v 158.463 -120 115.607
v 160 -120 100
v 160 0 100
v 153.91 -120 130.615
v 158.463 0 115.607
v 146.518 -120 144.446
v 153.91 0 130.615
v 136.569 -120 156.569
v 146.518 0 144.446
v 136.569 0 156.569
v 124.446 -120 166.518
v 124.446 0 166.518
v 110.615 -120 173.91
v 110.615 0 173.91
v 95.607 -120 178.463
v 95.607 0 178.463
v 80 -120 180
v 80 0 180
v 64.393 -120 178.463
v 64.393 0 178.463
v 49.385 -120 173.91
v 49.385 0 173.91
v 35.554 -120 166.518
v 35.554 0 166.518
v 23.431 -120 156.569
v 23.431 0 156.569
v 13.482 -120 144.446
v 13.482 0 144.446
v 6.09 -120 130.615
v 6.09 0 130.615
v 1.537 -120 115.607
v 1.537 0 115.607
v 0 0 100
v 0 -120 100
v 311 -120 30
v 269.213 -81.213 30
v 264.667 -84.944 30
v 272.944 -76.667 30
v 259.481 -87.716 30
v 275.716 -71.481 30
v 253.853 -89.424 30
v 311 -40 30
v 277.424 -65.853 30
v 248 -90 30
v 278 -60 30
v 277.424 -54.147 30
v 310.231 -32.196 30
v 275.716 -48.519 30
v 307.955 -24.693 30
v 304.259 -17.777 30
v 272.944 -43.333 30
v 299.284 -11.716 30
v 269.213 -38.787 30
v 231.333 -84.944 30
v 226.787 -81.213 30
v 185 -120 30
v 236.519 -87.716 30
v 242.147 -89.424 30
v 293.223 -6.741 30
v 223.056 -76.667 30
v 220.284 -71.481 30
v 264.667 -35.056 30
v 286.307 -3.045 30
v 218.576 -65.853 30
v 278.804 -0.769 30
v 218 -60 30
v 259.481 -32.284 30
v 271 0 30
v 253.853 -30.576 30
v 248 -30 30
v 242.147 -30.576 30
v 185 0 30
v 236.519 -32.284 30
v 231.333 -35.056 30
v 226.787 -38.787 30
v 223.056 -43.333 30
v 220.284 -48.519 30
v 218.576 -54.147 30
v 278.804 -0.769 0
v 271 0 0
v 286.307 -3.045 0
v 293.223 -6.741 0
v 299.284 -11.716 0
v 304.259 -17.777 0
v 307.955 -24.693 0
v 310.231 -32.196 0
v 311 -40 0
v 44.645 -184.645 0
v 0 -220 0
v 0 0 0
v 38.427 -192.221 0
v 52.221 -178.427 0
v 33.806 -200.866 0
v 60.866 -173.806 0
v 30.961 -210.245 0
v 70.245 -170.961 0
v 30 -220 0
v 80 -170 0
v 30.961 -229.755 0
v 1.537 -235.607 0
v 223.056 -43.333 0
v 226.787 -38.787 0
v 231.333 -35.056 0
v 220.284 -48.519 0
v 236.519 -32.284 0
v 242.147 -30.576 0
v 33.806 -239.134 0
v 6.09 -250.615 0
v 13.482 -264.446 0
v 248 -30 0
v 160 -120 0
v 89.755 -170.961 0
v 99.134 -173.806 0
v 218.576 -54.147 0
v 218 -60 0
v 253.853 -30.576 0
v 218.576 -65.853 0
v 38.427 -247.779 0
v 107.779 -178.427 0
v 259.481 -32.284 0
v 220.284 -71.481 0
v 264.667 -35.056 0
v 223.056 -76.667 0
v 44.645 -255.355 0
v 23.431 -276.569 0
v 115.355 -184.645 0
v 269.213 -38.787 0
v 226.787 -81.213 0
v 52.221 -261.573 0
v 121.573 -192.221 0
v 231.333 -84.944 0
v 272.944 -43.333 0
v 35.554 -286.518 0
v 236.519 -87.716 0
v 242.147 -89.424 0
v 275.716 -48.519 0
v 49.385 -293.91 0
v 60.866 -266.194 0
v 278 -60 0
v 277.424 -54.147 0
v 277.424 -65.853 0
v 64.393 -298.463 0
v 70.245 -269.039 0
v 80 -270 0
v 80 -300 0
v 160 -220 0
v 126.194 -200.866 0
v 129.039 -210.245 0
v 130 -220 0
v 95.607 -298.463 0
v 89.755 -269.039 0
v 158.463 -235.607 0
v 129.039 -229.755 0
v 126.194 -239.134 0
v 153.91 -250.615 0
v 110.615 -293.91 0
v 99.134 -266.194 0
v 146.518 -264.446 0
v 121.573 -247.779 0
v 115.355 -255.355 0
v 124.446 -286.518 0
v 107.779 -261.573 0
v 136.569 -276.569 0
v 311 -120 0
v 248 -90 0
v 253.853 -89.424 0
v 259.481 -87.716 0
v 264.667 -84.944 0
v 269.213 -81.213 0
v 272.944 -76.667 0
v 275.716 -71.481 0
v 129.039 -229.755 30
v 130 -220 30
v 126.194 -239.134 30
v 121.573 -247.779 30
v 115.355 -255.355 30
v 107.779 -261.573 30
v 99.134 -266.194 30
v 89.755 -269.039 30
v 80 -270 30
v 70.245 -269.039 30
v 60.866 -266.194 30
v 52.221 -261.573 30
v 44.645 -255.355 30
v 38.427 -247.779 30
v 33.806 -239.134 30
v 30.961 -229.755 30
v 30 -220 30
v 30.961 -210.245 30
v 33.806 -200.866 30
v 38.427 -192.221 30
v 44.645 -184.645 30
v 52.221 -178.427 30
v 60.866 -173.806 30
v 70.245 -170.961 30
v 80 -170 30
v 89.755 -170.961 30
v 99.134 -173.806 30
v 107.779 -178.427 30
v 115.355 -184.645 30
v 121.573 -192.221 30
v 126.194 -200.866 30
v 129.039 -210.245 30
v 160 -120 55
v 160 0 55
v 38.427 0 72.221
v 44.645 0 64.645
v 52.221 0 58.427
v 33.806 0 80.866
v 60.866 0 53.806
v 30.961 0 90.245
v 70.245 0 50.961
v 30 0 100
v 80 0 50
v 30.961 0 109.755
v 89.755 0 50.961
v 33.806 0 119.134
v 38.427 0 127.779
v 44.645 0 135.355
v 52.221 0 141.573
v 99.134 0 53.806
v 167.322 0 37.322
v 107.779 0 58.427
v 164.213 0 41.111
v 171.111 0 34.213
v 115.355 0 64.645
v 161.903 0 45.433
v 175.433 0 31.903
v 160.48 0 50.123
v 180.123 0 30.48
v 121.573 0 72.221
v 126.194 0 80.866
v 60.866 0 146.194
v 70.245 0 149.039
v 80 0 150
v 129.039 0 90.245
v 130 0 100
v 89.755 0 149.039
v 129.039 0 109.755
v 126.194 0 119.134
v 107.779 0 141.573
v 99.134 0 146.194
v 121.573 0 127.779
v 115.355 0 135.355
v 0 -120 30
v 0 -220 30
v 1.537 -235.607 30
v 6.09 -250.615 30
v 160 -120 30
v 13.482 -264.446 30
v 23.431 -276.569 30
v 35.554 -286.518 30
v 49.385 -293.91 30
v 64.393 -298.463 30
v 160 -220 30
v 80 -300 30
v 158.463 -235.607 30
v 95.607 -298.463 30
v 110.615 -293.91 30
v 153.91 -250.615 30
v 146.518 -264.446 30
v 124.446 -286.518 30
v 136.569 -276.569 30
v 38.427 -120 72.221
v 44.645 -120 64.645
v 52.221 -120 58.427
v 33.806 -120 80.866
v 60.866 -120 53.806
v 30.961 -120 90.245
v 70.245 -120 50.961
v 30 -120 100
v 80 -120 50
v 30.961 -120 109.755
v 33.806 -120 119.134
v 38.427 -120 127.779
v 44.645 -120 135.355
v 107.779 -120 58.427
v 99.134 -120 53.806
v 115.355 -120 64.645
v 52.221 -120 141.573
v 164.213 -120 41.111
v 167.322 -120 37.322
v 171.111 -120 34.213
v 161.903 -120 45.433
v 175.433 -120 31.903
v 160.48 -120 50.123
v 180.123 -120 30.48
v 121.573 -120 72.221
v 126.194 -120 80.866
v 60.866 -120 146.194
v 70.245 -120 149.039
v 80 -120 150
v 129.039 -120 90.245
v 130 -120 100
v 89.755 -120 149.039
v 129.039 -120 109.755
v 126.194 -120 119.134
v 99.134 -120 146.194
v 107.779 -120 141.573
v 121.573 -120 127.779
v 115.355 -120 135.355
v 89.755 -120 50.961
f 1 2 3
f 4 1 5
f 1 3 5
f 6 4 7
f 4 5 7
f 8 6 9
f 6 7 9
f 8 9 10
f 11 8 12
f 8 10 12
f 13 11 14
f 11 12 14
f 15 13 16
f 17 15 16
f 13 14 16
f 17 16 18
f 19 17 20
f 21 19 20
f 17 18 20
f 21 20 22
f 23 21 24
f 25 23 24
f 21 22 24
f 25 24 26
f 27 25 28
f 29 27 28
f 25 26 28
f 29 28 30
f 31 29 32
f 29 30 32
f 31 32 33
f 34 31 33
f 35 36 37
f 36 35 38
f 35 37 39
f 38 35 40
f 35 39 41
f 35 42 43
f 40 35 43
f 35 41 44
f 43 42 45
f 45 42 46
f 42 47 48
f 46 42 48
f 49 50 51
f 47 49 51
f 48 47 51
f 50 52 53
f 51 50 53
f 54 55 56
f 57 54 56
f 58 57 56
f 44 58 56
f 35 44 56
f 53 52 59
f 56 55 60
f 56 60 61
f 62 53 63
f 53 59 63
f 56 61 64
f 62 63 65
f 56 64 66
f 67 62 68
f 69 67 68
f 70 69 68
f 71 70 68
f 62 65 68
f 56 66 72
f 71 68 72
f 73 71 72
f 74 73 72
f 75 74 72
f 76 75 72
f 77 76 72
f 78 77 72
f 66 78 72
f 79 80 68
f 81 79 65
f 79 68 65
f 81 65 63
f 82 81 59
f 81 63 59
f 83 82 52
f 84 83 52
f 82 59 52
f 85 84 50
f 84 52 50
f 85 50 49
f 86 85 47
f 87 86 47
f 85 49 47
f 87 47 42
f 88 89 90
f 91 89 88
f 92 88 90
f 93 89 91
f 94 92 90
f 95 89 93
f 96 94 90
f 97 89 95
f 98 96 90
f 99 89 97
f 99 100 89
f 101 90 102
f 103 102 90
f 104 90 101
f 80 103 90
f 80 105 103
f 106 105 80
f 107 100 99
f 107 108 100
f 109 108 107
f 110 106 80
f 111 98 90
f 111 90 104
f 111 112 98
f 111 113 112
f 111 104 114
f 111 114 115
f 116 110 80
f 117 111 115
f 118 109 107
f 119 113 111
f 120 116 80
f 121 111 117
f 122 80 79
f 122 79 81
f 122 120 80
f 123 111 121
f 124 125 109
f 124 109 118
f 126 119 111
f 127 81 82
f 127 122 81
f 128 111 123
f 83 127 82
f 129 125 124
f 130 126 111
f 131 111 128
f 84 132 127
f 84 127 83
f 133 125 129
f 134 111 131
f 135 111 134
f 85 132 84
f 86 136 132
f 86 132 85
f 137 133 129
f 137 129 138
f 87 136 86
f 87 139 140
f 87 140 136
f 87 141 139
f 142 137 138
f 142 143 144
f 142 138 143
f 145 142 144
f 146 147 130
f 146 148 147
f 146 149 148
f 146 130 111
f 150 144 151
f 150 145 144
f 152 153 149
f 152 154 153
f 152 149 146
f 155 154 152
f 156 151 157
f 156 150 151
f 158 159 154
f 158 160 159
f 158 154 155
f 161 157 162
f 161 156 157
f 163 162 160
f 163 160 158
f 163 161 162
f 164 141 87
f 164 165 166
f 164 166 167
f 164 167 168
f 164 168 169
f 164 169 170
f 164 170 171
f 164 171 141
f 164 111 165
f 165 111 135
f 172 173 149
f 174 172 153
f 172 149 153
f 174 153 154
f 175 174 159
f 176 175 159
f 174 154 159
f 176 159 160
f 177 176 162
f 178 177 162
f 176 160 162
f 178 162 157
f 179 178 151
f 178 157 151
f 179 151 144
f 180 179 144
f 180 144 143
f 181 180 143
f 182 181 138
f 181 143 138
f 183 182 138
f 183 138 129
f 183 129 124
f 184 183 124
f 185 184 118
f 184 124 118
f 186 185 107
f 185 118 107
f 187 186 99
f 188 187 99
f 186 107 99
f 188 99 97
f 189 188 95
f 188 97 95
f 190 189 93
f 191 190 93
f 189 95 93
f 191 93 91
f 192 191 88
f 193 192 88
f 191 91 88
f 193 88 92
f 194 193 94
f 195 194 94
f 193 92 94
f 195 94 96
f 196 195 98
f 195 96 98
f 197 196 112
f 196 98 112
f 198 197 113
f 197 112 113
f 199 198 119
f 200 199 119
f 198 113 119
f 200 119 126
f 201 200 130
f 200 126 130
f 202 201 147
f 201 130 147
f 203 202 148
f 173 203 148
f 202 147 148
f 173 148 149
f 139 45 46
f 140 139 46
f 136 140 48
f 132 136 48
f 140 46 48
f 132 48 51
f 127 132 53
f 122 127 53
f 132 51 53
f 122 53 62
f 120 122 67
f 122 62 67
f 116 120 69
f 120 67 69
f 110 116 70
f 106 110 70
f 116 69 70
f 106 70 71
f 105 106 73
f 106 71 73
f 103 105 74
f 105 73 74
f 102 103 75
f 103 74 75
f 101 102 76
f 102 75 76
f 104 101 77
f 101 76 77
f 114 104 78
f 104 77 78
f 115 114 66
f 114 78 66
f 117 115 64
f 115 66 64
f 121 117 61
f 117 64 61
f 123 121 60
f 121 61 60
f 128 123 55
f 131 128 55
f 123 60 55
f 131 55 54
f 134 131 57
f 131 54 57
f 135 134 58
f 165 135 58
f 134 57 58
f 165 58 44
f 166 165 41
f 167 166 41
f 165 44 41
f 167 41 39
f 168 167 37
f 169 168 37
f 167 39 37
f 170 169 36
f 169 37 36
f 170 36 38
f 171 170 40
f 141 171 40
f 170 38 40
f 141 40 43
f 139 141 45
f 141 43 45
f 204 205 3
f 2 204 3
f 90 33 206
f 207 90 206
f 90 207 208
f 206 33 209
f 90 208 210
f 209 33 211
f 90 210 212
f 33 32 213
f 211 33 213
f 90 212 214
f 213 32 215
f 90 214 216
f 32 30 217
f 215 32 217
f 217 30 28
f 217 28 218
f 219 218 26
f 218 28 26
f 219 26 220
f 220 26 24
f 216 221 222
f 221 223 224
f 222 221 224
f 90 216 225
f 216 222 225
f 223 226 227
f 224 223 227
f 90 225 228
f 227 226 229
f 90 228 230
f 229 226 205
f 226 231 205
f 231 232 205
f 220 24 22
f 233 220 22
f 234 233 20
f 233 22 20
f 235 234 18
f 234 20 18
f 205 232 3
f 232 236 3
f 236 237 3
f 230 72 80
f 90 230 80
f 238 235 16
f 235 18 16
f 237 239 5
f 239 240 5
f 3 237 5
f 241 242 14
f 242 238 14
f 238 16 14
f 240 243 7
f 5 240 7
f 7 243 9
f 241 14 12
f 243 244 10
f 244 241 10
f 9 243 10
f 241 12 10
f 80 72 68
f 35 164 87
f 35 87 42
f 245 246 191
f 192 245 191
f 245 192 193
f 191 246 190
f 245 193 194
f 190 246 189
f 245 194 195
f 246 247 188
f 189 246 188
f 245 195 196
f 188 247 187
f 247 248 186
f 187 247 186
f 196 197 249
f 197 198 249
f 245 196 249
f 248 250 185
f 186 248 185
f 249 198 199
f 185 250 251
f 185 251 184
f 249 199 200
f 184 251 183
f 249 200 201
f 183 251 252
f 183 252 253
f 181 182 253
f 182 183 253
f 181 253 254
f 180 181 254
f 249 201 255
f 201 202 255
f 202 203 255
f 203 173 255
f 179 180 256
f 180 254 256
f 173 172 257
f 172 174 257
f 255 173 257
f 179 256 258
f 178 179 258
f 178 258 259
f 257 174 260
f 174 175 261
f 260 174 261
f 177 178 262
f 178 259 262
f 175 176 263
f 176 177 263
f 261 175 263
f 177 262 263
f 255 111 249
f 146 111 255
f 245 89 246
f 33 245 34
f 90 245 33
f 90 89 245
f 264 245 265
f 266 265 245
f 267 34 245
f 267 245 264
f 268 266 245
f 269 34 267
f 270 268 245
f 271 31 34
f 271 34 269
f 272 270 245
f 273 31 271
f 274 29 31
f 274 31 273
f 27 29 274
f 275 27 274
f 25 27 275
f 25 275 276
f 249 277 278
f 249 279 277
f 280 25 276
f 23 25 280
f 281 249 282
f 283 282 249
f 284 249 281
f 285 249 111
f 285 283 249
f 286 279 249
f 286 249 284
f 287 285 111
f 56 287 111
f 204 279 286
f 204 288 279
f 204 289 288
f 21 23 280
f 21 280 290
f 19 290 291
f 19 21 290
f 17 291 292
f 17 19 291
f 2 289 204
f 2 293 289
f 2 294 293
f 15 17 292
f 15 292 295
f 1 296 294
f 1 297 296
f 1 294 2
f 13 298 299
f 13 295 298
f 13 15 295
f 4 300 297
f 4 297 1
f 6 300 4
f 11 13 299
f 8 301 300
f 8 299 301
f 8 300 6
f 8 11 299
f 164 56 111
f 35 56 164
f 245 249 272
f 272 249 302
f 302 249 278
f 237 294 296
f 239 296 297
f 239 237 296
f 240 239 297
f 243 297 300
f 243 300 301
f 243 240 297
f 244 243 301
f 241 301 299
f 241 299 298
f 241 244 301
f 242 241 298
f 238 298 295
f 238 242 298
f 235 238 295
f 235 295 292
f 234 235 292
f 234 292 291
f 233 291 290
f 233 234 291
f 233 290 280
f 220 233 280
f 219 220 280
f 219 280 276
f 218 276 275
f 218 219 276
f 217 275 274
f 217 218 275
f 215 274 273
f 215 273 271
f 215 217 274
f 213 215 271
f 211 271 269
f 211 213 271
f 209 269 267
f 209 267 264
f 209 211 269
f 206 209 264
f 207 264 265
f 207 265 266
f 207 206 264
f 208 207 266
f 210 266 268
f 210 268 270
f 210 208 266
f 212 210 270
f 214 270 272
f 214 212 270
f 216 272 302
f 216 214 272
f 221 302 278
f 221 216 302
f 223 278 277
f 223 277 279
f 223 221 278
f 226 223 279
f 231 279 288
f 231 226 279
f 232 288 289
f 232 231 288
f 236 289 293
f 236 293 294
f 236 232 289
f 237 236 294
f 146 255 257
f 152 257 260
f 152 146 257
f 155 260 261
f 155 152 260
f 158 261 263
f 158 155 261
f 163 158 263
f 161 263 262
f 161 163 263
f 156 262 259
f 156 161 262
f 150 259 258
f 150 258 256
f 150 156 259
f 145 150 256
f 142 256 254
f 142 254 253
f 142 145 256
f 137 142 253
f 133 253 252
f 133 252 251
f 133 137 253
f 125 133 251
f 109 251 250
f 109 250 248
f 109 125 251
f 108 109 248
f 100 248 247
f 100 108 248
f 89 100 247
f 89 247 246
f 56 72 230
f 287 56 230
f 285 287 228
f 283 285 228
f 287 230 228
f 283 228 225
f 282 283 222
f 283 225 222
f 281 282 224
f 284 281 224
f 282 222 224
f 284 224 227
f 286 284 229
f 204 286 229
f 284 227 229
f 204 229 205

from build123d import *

# Parameters (mm, degrees)
F0_R     = 50
F1_DEPTH = 120
F2_R     = 30
F3_DEPTH = 30
F4_R     = 50
F5_DEPTH = 30


with BuildPart() as f1:
    # F0 (on Front) → F1 (new body)
    with BuildSketch(Plane.XZ):
        with BuildLine():
            Line((0, 100), (0, 0))
            Line((0, 0), (311, 0))
            Line((311, 0), (311, 30))
            Line((311, 30), (185, 30))
            ThreePointArc((185, 30), (167.32233, 37.32233), (160, 55))
            Line((160, 55), (160, 100))
            ThreePointArc((160, 100), (80, 180), (0, 100))
        make_face()
        with Locations((80, 100)):
            Circle(F0_R, mode=Mode.SUBTRACT)
    extrude(amount=F1_DEPTH)

    # F2 (on face) → F3 (cut)
    with BuildSketch(Plane.XY.offset(30)):
        with Locations((248, -60)):
            Circle(F2_R)
        with BuildLine():
            Line((311, 0), (271, 0))
            ThreePointArc((271, 0), (299.284271, -11.715729), (311, -40))
            Line((311, -40), (311, 0))
        make_face()
    extrude(amount=-F3_DEPTH, mode=Mode.SUBTRACT)

    # F4 (on face) → F5 (join)
    with BuildSketch(Plane(origin=(0, 0, 0), x_dir=(1, 0, 0), z_dir=(0, 0, -1))):
        with BuildLine():
            Line((0, 220), (0, 120))
            Line((0, 120), (160, 120))
            Line((160, 120), (160, 220))
            ThreePointArc((160, 220), (80, 300), (0, 220))
        make_face()
        with Locations((80, 220)):
            Circle(F4_R, mode=Mode.SUBTRACT)
    extrude(amount=-F5_DEPTH)


solid = f1.part
